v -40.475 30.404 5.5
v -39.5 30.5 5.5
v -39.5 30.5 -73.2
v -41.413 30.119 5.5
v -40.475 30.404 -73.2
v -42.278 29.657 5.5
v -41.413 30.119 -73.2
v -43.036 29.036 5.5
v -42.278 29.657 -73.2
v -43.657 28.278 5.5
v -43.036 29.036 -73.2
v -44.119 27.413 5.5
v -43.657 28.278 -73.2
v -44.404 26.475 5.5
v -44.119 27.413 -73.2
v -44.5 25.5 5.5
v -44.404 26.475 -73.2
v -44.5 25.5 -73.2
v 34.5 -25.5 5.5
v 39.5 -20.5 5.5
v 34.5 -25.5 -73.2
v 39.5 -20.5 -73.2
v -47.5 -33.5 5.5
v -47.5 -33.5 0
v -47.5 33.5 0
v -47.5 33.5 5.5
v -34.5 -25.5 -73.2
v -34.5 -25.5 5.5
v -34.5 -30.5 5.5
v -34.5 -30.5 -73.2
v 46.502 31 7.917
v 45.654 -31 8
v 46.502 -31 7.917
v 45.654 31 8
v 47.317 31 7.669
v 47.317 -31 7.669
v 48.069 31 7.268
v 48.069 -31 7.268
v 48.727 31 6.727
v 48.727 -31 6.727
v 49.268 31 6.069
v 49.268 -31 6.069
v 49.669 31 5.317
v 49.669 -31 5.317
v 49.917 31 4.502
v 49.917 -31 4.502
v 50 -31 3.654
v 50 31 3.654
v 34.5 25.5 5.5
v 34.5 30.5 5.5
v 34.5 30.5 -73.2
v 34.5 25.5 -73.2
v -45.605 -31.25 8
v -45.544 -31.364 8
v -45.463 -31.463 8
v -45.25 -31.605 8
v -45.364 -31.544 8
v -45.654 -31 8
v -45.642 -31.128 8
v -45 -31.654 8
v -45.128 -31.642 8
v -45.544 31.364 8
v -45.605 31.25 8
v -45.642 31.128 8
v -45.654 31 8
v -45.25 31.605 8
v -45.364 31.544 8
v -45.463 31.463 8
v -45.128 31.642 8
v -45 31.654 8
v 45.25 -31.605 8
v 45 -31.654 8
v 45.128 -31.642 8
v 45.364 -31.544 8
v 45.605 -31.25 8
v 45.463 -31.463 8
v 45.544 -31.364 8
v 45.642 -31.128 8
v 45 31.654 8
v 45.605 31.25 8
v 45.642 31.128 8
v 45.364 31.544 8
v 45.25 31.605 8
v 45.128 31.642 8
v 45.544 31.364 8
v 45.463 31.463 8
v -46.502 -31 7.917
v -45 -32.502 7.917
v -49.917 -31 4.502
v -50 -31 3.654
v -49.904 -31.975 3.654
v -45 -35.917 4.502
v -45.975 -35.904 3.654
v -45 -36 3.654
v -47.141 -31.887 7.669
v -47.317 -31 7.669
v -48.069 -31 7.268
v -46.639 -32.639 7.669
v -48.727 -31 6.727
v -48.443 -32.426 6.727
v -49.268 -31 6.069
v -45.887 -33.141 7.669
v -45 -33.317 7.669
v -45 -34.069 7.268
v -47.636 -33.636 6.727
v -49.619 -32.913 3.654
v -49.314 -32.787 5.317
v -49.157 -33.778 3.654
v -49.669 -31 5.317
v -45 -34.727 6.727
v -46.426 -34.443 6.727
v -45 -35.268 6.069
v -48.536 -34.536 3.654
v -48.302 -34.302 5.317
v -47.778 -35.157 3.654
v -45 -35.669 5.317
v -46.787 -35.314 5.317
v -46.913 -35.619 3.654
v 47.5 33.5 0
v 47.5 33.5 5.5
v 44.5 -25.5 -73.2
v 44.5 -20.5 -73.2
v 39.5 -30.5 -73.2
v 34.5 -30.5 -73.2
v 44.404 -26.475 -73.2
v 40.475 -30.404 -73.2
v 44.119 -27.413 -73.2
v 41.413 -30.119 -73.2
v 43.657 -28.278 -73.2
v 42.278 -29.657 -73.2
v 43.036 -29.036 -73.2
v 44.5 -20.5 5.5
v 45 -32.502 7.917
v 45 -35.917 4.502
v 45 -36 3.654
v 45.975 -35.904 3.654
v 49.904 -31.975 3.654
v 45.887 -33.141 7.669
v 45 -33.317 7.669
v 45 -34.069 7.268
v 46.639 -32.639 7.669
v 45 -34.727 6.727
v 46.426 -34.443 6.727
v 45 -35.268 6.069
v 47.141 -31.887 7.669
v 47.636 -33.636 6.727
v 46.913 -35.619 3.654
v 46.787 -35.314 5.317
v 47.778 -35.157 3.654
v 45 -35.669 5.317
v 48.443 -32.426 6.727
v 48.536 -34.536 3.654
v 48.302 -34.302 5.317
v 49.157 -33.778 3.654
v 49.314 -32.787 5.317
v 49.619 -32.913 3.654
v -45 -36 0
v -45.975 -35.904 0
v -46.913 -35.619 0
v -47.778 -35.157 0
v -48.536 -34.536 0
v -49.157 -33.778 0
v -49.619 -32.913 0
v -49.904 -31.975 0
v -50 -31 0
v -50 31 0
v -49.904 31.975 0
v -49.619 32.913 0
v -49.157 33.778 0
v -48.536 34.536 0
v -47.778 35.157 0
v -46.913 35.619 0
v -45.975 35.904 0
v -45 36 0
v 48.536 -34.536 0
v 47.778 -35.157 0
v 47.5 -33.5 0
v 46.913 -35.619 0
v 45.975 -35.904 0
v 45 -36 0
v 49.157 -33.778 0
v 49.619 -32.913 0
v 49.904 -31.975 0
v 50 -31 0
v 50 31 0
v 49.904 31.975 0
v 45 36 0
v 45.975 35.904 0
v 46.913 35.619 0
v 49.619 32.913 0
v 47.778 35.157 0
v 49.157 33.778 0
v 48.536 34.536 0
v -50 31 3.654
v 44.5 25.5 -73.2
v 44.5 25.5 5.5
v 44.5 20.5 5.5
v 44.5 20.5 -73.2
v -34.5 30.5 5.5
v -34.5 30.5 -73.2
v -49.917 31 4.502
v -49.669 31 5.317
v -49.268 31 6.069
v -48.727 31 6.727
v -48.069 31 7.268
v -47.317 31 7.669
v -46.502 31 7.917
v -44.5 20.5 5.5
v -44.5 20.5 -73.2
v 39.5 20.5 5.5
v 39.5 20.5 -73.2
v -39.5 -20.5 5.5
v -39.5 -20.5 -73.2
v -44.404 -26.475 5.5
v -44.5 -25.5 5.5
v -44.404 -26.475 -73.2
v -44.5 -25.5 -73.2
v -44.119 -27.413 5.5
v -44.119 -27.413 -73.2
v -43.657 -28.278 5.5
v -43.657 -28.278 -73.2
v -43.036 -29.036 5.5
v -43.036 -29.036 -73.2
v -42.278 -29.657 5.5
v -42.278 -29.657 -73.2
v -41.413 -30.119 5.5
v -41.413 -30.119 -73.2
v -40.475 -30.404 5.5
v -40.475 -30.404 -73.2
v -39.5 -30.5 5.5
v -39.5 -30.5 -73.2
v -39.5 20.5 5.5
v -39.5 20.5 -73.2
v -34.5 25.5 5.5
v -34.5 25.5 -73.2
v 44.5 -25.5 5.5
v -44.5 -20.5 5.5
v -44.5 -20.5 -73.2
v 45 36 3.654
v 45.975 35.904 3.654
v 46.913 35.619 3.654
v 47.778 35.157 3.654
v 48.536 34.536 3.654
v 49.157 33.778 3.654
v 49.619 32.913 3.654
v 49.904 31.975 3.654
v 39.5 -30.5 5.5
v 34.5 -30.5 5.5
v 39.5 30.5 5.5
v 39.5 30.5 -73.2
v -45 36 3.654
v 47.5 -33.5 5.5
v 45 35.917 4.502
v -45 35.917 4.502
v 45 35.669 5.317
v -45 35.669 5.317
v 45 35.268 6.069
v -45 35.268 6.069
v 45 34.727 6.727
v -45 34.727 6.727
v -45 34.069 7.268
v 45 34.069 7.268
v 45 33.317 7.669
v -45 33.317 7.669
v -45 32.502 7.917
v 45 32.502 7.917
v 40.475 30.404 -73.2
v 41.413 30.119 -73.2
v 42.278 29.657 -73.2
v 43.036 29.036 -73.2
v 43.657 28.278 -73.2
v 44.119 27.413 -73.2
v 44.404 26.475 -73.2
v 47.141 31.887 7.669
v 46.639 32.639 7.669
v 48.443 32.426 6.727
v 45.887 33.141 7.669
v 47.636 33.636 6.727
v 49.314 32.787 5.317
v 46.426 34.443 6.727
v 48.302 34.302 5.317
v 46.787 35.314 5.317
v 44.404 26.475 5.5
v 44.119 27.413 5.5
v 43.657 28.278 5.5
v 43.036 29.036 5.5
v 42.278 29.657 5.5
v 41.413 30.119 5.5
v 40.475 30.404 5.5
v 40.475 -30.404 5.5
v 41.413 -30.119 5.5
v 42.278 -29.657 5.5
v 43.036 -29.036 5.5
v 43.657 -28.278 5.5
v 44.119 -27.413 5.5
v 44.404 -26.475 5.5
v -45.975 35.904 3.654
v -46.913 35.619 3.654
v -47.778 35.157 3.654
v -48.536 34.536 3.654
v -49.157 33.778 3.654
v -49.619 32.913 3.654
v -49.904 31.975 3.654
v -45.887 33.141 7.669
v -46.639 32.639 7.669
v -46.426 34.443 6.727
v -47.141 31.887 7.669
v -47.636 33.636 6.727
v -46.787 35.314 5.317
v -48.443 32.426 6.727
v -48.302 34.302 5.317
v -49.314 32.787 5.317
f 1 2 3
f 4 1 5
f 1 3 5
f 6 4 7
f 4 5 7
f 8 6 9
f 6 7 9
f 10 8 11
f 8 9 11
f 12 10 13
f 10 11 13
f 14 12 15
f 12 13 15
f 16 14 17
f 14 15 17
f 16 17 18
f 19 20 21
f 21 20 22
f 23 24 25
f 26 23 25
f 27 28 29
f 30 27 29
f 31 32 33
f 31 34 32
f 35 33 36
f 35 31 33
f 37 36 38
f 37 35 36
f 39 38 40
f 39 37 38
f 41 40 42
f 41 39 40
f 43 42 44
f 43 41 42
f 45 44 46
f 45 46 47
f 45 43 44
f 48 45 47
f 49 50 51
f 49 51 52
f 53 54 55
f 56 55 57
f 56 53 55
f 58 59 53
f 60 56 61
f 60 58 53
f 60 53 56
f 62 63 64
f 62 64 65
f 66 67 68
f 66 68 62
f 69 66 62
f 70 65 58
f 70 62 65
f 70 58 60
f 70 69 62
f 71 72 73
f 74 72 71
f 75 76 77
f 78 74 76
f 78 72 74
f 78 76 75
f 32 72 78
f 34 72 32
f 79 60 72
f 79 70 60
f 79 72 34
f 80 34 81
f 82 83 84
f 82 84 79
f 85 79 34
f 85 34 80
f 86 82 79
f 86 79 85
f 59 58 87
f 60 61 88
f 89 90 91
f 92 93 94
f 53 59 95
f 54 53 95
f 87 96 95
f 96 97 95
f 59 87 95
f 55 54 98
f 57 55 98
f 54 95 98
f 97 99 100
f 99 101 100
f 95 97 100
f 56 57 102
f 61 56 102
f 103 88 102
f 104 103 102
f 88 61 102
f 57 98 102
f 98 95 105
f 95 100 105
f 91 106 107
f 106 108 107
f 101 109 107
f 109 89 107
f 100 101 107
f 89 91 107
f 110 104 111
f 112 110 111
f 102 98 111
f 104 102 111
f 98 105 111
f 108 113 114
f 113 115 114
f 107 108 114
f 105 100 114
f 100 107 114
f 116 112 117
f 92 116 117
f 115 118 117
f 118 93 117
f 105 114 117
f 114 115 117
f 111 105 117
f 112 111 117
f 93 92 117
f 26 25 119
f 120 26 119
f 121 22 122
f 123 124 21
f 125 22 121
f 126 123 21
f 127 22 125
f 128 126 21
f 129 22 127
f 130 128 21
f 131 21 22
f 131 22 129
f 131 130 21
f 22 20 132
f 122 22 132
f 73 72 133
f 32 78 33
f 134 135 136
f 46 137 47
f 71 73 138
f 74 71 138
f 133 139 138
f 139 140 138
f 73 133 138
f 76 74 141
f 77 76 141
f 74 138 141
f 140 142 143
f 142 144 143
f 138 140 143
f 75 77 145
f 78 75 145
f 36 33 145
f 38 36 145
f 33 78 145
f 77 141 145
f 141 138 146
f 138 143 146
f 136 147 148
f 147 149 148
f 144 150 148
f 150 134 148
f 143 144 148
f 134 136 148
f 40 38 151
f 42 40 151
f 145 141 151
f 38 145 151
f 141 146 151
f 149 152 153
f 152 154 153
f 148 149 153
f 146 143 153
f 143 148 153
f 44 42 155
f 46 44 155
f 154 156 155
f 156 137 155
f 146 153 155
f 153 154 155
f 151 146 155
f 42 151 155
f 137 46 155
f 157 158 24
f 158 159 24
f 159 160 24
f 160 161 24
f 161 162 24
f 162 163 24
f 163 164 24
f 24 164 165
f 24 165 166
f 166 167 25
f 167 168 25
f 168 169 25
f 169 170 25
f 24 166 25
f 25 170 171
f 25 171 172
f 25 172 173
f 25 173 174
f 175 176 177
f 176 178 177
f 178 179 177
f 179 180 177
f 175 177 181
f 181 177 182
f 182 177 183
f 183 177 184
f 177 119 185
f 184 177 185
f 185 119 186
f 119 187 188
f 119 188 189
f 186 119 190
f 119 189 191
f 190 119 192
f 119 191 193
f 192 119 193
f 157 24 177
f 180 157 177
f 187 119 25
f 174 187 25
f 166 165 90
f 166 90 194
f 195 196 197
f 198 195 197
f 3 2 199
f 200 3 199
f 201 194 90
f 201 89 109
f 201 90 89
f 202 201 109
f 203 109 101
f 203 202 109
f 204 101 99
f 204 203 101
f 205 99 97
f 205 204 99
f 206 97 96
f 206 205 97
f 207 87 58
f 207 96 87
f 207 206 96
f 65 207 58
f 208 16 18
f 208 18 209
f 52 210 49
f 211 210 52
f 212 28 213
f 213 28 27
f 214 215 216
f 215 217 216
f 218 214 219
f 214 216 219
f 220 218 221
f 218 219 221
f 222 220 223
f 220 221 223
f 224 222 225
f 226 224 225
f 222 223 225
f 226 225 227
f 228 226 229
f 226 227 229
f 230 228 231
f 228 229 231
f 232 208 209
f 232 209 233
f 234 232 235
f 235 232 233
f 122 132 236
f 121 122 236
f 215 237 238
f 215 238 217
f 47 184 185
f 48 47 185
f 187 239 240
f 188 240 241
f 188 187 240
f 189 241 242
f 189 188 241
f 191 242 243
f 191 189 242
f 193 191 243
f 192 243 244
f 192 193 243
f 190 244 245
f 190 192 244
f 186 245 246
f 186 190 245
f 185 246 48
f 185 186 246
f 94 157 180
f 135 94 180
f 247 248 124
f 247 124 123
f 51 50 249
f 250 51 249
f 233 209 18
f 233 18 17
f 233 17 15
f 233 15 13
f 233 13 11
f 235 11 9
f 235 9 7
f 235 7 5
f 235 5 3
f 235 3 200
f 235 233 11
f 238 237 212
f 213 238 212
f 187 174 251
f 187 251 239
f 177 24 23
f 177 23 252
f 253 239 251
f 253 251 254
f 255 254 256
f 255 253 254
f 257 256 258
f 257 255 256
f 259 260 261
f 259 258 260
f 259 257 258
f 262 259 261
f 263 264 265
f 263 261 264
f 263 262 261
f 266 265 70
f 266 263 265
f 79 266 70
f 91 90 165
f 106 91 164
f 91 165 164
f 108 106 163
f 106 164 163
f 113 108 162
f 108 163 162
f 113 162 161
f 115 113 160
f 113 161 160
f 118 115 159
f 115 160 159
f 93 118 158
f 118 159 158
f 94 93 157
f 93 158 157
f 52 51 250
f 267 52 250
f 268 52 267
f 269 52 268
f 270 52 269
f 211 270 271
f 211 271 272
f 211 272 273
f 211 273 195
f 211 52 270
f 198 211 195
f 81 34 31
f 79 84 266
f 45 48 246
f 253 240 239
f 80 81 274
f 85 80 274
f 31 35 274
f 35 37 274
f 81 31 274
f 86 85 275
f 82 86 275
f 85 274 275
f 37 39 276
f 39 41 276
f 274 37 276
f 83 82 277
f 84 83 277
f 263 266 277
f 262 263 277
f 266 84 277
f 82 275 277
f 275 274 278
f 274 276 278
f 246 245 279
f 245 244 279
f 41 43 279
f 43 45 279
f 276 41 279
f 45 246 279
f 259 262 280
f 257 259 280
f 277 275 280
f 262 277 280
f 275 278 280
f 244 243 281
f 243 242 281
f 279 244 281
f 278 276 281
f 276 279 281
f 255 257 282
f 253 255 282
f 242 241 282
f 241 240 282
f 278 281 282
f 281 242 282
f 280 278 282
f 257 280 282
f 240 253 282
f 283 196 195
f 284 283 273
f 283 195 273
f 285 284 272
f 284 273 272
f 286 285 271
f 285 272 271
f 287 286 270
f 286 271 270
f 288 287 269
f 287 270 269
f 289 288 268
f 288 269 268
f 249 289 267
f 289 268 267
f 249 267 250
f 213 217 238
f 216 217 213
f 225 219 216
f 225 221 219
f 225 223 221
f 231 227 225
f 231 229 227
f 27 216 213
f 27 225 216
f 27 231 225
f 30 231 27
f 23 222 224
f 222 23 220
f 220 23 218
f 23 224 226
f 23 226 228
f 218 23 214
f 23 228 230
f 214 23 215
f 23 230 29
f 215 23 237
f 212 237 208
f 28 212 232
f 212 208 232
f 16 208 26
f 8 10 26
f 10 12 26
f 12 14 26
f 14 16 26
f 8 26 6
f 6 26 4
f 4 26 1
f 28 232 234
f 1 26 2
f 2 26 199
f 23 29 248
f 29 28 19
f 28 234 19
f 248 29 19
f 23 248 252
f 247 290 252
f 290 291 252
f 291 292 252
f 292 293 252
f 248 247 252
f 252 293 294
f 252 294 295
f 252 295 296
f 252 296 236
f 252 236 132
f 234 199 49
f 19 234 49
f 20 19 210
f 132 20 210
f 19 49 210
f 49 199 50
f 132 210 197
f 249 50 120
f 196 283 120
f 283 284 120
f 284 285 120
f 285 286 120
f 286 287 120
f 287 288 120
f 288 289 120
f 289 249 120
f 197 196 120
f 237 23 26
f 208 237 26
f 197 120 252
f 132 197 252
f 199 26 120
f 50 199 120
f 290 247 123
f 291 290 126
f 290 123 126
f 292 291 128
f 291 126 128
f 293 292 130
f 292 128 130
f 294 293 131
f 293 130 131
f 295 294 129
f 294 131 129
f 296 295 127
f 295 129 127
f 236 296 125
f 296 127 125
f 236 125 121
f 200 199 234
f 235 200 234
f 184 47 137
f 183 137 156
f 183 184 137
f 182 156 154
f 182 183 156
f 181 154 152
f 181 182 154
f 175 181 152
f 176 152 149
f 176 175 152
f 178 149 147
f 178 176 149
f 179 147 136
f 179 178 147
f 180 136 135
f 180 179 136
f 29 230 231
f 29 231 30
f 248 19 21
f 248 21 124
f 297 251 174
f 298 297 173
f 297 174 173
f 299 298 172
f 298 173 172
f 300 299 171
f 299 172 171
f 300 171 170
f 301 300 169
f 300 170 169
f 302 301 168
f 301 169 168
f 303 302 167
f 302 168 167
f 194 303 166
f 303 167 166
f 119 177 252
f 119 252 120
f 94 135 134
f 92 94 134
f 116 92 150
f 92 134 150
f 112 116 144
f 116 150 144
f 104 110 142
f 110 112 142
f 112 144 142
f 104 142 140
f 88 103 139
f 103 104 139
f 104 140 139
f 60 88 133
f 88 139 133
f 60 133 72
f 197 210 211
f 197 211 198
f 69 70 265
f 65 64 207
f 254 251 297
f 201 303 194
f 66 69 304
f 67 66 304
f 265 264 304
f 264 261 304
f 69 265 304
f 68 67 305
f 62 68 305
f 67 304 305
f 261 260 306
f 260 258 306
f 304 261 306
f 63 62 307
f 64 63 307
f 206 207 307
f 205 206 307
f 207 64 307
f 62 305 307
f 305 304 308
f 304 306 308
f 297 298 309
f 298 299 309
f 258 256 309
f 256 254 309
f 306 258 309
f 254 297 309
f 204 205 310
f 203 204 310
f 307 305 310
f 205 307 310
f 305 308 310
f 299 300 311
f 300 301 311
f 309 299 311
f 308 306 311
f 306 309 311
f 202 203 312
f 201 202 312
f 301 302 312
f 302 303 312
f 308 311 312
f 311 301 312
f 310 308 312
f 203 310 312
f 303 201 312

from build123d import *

# Parameters (mm, degrees)
F0_W         = 100
F0_H         = 72
F1_DEPTH     = 8
F2_T         = -2.5
F3_W         = 10
F3_H         = 10
F4_DEPTH     = 78.7
F5_R         = 4.3455844123
F6_R         = 5
F7_T1_DEPTH  = 20.5
F7_T3_DEPTH  = 91.2
F7_T6_ANGLE  = 90
F7_T8_ANGLE  = 90
F7_T10_ANGLE = 90
F8_SIZE      = 5
F9_T1_DEPTH  = 20.5
F9_T4_ANGLE  = 90


# Not quite as in the source:
# - a fillet or chamfer that OpenCascade refuses, or shapes differently, is made with other operations: its cross-section is extruded or revolved along the edge and cut away or added


with BuildPart() as f1:
    # F0 (on Top) → F1 (new body)
    with BuildSketch(Plane.XY):
        Rectangle(F0_W, F0_H)
    extrude(amount=F1_DEPTH)

    # F2
    f2_openings = [f1.faces().sort_by_distance(p)[0] for p in [
        (0, 0, 0),
    ]]
    offset(amount=F2_T, openings=f2_openings)

    # F3 (on face) → F4 (join)
    with BuildSketch(Plane(origin=(0, 0, 5.5), x_dir=(1, 0, 0), z_dir=(0, 0, -1))):
        with Locations((-39.5, -25.5)):
            Rectangle(F3_W, F3_H)
        with Locations((39.5, -25.5)):
            Rectangle(F3_W, F3_H)
        with Locations((39.5, 25.5)):
            Rectangle(F3_W, F3_H)
        with Locations((-39.5, 25.5)):
            Rectangle(F3_W, F3_H)
    extrude(amount=F4_DEPTH)

    # F5
    f5_edges = [f1.edges().sort_by_distance(p)[0] for p in [
        (-50, 0, 8),
        (0, -36, 8),
        (50, 0, 8),
        (0, 36, 8),
    ]]
    fillet(f5_edges, radius=F5_R)

    # F6
    f6_edges = [f1.edges().sort_by_distance(p)[0] for p in [
        (-44.5, -30.5, -33.85),
    ]]
    fillet(f6_edges, radius=F6_R)

    # F7: fillet of radius 5 on 6 edges, made by hand

    # F7_s2 → F7_t1 (cut)
    with BuildSketch(Plane.XY.offset(-12.5)):
        with BuildLine():
            ThreePointArc((-50, -31), (-48.5355339059, -34.5355339059), (-45, -36))
            Line((-45, -36), (-50, -36))
            Line((-50, -36), (-50, -31))
        make_face()
        with BuildLine():
            ThreePointArc((-45, 36), (-48.5355339059, 34.5355339059), (-50, 31))
            Line((-50, 31), (-50, 36))
            Line((-50, 36), (-45, 36))
        make_face()
        with BuildLine():
            ThreePointArc((45, 36), (48.5355339059, 34.5355339059), (50, 31))
            Line((50, 31), (50, 36))
            Line((50, 36), (45, 36))
        make_face()
    extrude(amount=F7_T1_DEPTH, mode=Mode.SUBTRACT)

    # F7_s4 → F7_t3 (cut)
    with BuildSketch(Plane.XY.offset(-85.7)):
        with BuildLine():
            ThreePointArc((39.5, -30.5), (43.0355339059, -29.0355339059), (44.5, -25.5))
            Line((44.5, -25.5), (44.5, -30.5))
            Line((44.5, -30.5), (39.5, -30.5))
        make_face()
        with BuildLine():
            ThreePointArc((44.5, 25.5), (43.0355339059, 29.0355339059), (39.5, 30.5))
            Line((39.5, 30.5), (44.5, 30.5))
            Line((44.5, 30.5), (44.5, 25.5))
        make_face()
        with BuildLine():
            ThreePointArc((-39.5, 30.5), (-43.0355339059, 29.0355339059), (-44.5, 25.5))
            Line((-44.5, 25.5), (-44.5, 30.5))
            Line((-44.5, 30.5), (-39.5, 30.5))
        make_face()
    extrude(amount=F7_T3_DEPTH, mode=Mode.SUBTRACT)

    # F7_s5 → F7_t6 (revolve, cut)
    with BuildSketch(Plane.XZ.offset(-31)):
        with BuildLine():
            ThreePointArc((45.6544155877, 8), (48.7272077939, 6.7272077939), (50, 3.6544155877))
            Line((50, 3.6544155877), (50, 8))
            Line((50, 8), (45.6544155877, 8))
        make_face()
    revolve(axis=Axis((45, 31, 8), (0, 0, 1)), revolution_arc=F7_T6_ANGLE, mode=Mode.SUBTRACT)

    # F7_s7 → F7_t8 (revolve, cut)
    with BuildSketch(Plane.YZ.offset(-45)):
        with BuildLine():
            ThreePointArc((31.6544155877, 8), (34.7272077939, 6.7272077939), (36, 3.6544155877))
            Line((36, 3.6544155877), (36, 8))
            Line((36, 8), (31.6544155877, 8))
        make_face()
    revolve(axis=Axis((-45, 31, 8), (0, 0, 1)), revolution_arc=F7_T8_ANGLE, mode=Mode.SUBTRACT)

    # F7_s9 → F7_t10 (revolve, cut)
    with BuildSketch(Plane.XZ.offset(31)):
        with BuildLine():
            ThreePointArc((-45.6544155877, 8), (-48.7272077939, 6.7272077939), (-50, 3.6544155877))
            Line((-50, 3.6544155877), (-50, 8))
            Line((-50, 8), (-45.6544155877, 8))
        make_face()
    revolve(axis=Axis((-45, -31, 8), (0, 0, 1)), revolution_arc=F7_T10_ANGLE, mode=Mode.SUBTRACT)

    # F8
    f8_edges = [f1.edges().sort_by_distance(p)[0] for p in [
        (-34.5, -20.5, -33.85),
        (-34.5, 20.5, -33.85),
        (34.5, 20.5, -33.85),
        (34.5, -20.5, -33.85),
    ]]
    chamfer(f8_edges, length=F8_SIZE)

    # F9: fillet of radius 5 on 1 edges, made by hand

    # F9_s2 → F9_t1 (cut)
    with BuildSketch(Plane.XY.offset(-12.5)):
        with BuildLine():
            ThreePointArc((50, -31), (48.5355339059, -34.5355339059), (45, -36))
            Line((45, -36), (50, -36))
            Line((50, -36), (50, -31))
        make_face()
    extrude(amount=F9_T1_DEPTH, mode=Mode.SUBTRACT)

    # F9_s3 → F9_t4 (revolve, cut)
    with BuildSketch(Plane.YZ.offset(45)):
        with BuildLine():
            ThreePointArc((-31.6544155877, 8), (-34.7272077939, 6.7272077939), (-36, 3.6544155877))
            Line((-36, 3.6544155877), (-36, 8))
            Line((-36, 8), (-31.6544155877, 8))
        make_face()
    revolve(axis=Axis((45, -31, 8), (0, 0, 1)), revolution_arc=F9_T4_ANGLE, mode=Mode.SUBTRACT)


solid = f1.part
